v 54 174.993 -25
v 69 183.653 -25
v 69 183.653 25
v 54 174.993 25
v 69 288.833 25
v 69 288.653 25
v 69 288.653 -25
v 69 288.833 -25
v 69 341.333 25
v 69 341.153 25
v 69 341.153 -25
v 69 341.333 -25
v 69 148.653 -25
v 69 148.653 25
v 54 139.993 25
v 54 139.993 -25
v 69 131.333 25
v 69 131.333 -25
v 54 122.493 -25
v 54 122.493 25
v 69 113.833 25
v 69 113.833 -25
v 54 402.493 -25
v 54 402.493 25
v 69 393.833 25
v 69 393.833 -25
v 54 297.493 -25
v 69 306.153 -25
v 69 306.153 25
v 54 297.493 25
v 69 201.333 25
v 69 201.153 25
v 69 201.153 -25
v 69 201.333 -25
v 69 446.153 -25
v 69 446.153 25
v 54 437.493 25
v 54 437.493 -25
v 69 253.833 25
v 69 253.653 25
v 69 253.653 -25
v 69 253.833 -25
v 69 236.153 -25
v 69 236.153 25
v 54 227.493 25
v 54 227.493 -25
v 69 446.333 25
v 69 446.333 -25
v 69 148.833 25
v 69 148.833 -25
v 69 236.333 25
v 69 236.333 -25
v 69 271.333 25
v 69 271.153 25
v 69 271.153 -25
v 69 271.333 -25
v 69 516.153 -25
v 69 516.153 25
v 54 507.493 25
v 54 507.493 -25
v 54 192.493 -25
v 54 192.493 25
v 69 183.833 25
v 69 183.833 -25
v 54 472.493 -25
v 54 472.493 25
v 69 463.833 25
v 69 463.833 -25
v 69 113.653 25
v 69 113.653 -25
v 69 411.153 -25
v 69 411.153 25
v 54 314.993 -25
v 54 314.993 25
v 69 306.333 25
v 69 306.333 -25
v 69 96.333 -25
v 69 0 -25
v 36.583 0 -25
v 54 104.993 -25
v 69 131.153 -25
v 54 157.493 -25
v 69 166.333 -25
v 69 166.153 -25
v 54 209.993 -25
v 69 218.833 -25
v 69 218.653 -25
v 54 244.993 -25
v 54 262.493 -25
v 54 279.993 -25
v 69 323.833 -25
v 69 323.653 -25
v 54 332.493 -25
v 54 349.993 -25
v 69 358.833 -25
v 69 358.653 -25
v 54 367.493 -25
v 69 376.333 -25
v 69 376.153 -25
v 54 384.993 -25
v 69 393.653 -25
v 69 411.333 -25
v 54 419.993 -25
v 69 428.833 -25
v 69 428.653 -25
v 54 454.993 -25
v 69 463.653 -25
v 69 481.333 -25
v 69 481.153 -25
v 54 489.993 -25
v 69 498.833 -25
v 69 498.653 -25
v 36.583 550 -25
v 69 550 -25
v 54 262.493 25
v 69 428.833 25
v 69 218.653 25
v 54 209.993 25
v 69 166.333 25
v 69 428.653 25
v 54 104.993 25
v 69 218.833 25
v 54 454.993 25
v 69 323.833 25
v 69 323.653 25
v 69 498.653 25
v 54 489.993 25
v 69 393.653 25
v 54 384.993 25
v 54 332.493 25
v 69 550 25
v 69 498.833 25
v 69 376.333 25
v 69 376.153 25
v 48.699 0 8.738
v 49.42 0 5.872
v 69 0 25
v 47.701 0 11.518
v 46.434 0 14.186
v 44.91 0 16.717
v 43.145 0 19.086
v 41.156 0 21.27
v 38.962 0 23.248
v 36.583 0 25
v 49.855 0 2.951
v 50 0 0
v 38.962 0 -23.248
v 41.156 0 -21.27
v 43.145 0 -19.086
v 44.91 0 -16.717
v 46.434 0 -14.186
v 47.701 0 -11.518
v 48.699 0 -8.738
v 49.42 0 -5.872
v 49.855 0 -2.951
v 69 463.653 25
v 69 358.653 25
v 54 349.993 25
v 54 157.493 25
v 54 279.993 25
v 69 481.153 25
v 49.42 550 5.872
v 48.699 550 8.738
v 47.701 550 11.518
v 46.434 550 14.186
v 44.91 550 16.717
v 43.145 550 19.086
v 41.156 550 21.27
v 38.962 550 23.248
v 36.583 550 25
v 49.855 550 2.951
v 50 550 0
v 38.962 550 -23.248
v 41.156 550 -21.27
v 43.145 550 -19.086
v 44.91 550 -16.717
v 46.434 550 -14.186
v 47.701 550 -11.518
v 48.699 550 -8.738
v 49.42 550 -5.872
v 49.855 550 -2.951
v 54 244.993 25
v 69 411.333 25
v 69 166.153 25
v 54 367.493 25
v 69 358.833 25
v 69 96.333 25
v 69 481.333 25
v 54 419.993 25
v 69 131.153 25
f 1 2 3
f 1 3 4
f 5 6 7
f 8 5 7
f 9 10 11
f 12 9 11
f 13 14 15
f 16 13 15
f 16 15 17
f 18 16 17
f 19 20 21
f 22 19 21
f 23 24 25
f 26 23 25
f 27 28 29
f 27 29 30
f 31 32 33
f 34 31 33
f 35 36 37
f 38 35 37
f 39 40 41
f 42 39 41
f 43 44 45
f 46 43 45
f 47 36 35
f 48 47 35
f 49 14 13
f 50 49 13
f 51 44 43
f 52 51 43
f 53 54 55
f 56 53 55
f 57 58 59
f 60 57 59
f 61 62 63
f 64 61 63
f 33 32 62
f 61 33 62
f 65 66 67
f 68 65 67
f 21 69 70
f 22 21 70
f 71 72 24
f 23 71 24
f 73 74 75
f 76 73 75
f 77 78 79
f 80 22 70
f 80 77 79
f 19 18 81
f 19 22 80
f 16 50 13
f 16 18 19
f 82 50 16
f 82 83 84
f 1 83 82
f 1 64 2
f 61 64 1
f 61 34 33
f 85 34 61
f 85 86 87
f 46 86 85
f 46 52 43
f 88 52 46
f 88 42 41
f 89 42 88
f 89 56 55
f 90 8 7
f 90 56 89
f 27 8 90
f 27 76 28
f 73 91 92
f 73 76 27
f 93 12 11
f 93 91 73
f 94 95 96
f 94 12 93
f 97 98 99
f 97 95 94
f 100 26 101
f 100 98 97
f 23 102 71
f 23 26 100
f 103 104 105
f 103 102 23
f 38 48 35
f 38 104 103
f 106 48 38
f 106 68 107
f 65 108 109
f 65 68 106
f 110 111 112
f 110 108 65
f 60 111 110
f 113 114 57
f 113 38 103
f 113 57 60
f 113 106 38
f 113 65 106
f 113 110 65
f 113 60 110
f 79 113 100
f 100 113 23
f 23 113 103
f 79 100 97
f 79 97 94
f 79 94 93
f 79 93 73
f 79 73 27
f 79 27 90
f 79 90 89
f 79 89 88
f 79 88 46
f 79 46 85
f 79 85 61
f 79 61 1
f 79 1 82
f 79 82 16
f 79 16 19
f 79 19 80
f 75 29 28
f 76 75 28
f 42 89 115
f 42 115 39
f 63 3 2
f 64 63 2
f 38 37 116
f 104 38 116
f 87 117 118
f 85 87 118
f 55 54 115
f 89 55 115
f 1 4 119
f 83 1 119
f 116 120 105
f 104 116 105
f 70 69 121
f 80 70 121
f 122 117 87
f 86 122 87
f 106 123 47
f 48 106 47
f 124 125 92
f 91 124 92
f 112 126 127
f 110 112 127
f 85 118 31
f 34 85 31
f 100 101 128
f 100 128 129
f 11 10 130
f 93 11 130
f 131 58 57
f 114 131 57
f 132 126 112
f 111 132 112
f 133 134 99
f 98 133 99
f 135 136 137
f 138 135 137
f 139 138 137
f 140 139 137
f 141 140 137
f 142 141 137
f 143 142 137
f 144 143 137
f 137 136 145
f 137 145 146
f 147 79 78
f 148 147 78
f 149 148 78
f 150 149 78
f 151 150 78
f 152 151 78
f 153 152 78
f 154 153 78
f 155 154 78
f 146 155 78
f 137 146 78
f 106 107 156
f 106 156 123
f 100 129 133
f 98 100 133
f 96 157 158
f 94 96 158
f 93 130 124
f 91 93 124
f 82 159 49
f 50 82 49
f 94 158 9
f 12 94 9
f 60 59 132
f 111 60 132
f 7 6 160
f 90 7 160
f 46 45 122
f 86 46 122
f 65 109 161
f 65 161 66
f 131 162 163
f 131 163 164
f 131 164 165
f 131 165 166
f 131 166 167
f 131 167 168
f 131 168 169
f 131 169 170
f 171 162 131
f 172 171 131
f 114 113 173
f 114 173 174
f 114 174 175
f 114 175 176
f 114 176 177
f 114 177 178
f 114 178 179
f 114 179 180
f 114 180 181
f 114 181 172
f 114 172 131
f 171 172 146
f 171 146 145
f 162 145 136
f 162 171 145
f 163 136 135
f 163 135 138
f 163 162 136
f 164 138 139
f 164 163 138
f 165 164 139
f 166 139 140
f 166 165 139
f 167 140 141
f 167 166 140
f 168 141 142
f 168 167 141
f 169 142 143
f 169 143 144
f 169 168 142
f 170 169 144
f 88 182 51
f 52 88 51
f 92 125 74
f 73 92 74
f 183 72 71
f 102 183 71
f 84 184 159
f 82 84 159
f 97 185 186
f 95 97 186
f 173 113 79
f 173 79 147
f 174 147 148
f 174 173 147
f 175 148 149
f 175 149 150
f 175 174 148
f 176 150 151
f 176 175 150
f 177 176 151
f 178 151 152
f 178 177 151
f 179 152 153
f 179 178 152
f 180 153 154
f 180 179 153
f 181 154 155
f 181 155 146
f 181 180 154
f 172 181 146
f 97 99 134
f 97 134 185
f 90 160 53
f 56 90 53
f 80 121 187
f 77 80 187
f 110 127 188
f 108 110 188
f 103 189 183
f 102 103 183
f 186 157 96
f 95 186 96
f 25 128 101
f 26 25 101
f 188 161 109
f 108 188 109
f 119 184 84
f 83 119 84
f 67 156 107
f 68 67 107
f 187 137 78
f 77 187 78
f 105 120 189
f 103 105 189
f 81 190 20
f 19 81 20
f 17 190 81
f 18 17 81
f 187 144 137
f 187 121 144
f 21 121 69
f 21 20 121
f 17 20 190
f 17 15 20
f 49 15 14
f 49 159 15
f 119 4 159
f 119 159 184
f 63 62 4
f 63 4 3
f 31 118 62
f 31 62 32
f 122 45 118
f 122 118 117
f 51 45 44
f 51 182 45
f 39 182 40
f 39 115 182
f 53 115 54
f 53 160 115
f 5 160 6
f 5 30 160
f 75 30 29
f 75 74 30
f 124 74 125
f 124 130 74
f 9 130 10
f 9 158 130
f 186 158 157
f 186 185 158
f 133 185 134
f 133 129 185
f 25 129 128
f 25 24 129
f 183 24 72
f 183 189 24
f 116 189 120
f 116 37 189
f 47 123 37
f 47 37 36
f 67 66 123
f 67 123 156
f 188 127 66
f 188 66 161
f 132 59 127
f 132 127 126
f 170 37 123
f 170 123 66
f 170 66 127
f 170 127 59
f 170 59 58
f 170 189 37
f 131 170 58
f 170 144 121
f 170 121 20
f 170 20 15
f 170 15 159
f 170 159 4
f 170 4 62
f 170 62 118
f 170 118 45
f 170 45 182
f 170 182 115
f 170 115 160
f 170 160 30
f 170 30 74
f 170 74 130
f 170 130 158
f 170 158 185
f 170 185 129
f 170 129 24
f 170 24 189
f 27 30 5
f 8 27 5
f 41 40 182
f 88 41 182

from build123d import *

# Parameters (mm, degrees)
BOSS_EXTRUDE1_DEPTH = 550
CUT_EXTRUDE1_DEPTH  = 73
BOSS_EXTRUDE2_DEPTH = 550


with BuildPart() as part:
    # Sketch1 → Boss-Extrude1 (new body)
    with BuildSketch(Plane(origin=(0, 0, 0), x_dir=(1, 0, 0), z_dir=(0, 1, 0))):
        with BuildLine():
            Line((43.301270189, -25), (69, -25))
            Line((69, -25), (69, 25))
            Line((69, 25), (43.301270189, 25))
            ThreePointArc((43.301270189, 25), (50, 0), (43.301270189, -25))
        make_face()
    extrude(amount=BOSS_EXTRUDE1_DEPTH)

    # Sketch2 → Cut-Extrude1 (cut)
    with BuildSketch(Plane.XY.offset(25)):
        Polygon((54, 489.993192311), (76.5, 477.002811254), (76.5, 502.983573367), align=None)
        Polygon((54, 507.493192311), (76.5, 494.502811254), (76.5, 520.483573367), align=None)
        Polygon((54, 472.493192311), (76.5, 459.502811254), (76.5, 485.483573367), align=None)
        Polygon((54, 454.993192311), (76.5, 442.002811254), (76.5, 467.983573367), align=None)
        Polygon((54, 437.493192311), (76.5, 424.502811254), (76.5, 450.483573367), align=None)
        Polygon((54, 419.993192311), (76.5, 407.002811254), (76.5, 432.983573367), align=None)
        Polygon((54, 402.493192311), (76.5, 389.502811254), (76.5, 415.483573367), align=None)
        Polygon((54, 384.993192311), (76.5, 372.002811254), (76.5, 397.983573367), align=None)
        Polygon((54, 367.493192311), (76.5, 354.502811254), (76.5, 380.483573367), align=None)
        Polygon((54, 349.993192311), (76.5, 337.002811254), (76.5, 362.983573367), align=None)
        Polygon((54, 332.493192311), (76.5, 319.502811254), (76.5, 345.483573367), align=None)
        Polygon((54, 314.993192311), (76.5, 302.002811254), (76.5, 327.983573367), align=None)
        Polygon((54, 297.493192311), (76.5, 284.502811254), (76.5, 310.483573367), align=None)
        Polygon((54, 279.993192311), (76.5, 267.002811254), (76.5, 292.983573367), align=None)
        Polygon((54, 262.493192311), (76.5, 249.502811254), (76.5, 275.483573367), align=None)
        Polygon((54, 244.993192311), (76.5, 232.002811254), (76.5, 257.983573367), align=None)
        Polygon((54, 227.493192311), (76.5, 214.502811254), (76.5, 240.483573367), align=None)
        Polygon((54, 209.993192311), (76.5, 197.002811254), (76.5, 222.983573367), align=None)
        Polygon((54, 192.493192311), (76.5, 179.502811254), (76.5, 205.483573367), align=None)
        Polygon((54, 174.993192311), (76.5, 162.002811254), (76.5, 187.983573367), align=None)
        Polygon((54, 157.493192311), (76.5, 144.502811254), (76.5, 170.483573367), align=None)
        Polygon((54, 139.993192311), (76.5, 127.002811254), (76.5, 152.983573367), align=None)
        Polygon((54, 122.493192311), (76.5, 109.502811254), (76.5, 135.483573367), align=None)
        Polygon((54, 104.993192311), (76.5, 92.002811254), (76.5, 117.983573367), align=None)
    extrude(amount=-CUT_EXTRUDE1_DEPTH, mode=Mode.SUBTRACT)

    # Sketch3 → Boss-Extrude2 (add)
    with BuildSketch(Plane(origin=(0, 550, 0), x_dir=(1, 0, 0), z_dir=(0, 1, 0))):
        with BuildLine():
            ThreePointArc((43.301270189, -25), (48.296291314, -12.940952255), (50, 0))
            ThreePointArc((50, 0), (46.433820369, -14.186371655), (36.583123952, -25))
            Line((36.583123952, -25), (43.301270189, -25))
        make_face()
        with BuildLine():
            ThreePointArc((50, 0), (48.296291314, 12.940952255), (43.301270189, 25))
            Line((43.301270189, 25), (36.583123952, 25))
            ThreePointArc((36.583123952, 25), (46.433820369, 14.186371655), (50, 0))
        make_face()
    extrude(amount=-BOSS_EXTRUDE2_DEPTH)


solid = part.part
